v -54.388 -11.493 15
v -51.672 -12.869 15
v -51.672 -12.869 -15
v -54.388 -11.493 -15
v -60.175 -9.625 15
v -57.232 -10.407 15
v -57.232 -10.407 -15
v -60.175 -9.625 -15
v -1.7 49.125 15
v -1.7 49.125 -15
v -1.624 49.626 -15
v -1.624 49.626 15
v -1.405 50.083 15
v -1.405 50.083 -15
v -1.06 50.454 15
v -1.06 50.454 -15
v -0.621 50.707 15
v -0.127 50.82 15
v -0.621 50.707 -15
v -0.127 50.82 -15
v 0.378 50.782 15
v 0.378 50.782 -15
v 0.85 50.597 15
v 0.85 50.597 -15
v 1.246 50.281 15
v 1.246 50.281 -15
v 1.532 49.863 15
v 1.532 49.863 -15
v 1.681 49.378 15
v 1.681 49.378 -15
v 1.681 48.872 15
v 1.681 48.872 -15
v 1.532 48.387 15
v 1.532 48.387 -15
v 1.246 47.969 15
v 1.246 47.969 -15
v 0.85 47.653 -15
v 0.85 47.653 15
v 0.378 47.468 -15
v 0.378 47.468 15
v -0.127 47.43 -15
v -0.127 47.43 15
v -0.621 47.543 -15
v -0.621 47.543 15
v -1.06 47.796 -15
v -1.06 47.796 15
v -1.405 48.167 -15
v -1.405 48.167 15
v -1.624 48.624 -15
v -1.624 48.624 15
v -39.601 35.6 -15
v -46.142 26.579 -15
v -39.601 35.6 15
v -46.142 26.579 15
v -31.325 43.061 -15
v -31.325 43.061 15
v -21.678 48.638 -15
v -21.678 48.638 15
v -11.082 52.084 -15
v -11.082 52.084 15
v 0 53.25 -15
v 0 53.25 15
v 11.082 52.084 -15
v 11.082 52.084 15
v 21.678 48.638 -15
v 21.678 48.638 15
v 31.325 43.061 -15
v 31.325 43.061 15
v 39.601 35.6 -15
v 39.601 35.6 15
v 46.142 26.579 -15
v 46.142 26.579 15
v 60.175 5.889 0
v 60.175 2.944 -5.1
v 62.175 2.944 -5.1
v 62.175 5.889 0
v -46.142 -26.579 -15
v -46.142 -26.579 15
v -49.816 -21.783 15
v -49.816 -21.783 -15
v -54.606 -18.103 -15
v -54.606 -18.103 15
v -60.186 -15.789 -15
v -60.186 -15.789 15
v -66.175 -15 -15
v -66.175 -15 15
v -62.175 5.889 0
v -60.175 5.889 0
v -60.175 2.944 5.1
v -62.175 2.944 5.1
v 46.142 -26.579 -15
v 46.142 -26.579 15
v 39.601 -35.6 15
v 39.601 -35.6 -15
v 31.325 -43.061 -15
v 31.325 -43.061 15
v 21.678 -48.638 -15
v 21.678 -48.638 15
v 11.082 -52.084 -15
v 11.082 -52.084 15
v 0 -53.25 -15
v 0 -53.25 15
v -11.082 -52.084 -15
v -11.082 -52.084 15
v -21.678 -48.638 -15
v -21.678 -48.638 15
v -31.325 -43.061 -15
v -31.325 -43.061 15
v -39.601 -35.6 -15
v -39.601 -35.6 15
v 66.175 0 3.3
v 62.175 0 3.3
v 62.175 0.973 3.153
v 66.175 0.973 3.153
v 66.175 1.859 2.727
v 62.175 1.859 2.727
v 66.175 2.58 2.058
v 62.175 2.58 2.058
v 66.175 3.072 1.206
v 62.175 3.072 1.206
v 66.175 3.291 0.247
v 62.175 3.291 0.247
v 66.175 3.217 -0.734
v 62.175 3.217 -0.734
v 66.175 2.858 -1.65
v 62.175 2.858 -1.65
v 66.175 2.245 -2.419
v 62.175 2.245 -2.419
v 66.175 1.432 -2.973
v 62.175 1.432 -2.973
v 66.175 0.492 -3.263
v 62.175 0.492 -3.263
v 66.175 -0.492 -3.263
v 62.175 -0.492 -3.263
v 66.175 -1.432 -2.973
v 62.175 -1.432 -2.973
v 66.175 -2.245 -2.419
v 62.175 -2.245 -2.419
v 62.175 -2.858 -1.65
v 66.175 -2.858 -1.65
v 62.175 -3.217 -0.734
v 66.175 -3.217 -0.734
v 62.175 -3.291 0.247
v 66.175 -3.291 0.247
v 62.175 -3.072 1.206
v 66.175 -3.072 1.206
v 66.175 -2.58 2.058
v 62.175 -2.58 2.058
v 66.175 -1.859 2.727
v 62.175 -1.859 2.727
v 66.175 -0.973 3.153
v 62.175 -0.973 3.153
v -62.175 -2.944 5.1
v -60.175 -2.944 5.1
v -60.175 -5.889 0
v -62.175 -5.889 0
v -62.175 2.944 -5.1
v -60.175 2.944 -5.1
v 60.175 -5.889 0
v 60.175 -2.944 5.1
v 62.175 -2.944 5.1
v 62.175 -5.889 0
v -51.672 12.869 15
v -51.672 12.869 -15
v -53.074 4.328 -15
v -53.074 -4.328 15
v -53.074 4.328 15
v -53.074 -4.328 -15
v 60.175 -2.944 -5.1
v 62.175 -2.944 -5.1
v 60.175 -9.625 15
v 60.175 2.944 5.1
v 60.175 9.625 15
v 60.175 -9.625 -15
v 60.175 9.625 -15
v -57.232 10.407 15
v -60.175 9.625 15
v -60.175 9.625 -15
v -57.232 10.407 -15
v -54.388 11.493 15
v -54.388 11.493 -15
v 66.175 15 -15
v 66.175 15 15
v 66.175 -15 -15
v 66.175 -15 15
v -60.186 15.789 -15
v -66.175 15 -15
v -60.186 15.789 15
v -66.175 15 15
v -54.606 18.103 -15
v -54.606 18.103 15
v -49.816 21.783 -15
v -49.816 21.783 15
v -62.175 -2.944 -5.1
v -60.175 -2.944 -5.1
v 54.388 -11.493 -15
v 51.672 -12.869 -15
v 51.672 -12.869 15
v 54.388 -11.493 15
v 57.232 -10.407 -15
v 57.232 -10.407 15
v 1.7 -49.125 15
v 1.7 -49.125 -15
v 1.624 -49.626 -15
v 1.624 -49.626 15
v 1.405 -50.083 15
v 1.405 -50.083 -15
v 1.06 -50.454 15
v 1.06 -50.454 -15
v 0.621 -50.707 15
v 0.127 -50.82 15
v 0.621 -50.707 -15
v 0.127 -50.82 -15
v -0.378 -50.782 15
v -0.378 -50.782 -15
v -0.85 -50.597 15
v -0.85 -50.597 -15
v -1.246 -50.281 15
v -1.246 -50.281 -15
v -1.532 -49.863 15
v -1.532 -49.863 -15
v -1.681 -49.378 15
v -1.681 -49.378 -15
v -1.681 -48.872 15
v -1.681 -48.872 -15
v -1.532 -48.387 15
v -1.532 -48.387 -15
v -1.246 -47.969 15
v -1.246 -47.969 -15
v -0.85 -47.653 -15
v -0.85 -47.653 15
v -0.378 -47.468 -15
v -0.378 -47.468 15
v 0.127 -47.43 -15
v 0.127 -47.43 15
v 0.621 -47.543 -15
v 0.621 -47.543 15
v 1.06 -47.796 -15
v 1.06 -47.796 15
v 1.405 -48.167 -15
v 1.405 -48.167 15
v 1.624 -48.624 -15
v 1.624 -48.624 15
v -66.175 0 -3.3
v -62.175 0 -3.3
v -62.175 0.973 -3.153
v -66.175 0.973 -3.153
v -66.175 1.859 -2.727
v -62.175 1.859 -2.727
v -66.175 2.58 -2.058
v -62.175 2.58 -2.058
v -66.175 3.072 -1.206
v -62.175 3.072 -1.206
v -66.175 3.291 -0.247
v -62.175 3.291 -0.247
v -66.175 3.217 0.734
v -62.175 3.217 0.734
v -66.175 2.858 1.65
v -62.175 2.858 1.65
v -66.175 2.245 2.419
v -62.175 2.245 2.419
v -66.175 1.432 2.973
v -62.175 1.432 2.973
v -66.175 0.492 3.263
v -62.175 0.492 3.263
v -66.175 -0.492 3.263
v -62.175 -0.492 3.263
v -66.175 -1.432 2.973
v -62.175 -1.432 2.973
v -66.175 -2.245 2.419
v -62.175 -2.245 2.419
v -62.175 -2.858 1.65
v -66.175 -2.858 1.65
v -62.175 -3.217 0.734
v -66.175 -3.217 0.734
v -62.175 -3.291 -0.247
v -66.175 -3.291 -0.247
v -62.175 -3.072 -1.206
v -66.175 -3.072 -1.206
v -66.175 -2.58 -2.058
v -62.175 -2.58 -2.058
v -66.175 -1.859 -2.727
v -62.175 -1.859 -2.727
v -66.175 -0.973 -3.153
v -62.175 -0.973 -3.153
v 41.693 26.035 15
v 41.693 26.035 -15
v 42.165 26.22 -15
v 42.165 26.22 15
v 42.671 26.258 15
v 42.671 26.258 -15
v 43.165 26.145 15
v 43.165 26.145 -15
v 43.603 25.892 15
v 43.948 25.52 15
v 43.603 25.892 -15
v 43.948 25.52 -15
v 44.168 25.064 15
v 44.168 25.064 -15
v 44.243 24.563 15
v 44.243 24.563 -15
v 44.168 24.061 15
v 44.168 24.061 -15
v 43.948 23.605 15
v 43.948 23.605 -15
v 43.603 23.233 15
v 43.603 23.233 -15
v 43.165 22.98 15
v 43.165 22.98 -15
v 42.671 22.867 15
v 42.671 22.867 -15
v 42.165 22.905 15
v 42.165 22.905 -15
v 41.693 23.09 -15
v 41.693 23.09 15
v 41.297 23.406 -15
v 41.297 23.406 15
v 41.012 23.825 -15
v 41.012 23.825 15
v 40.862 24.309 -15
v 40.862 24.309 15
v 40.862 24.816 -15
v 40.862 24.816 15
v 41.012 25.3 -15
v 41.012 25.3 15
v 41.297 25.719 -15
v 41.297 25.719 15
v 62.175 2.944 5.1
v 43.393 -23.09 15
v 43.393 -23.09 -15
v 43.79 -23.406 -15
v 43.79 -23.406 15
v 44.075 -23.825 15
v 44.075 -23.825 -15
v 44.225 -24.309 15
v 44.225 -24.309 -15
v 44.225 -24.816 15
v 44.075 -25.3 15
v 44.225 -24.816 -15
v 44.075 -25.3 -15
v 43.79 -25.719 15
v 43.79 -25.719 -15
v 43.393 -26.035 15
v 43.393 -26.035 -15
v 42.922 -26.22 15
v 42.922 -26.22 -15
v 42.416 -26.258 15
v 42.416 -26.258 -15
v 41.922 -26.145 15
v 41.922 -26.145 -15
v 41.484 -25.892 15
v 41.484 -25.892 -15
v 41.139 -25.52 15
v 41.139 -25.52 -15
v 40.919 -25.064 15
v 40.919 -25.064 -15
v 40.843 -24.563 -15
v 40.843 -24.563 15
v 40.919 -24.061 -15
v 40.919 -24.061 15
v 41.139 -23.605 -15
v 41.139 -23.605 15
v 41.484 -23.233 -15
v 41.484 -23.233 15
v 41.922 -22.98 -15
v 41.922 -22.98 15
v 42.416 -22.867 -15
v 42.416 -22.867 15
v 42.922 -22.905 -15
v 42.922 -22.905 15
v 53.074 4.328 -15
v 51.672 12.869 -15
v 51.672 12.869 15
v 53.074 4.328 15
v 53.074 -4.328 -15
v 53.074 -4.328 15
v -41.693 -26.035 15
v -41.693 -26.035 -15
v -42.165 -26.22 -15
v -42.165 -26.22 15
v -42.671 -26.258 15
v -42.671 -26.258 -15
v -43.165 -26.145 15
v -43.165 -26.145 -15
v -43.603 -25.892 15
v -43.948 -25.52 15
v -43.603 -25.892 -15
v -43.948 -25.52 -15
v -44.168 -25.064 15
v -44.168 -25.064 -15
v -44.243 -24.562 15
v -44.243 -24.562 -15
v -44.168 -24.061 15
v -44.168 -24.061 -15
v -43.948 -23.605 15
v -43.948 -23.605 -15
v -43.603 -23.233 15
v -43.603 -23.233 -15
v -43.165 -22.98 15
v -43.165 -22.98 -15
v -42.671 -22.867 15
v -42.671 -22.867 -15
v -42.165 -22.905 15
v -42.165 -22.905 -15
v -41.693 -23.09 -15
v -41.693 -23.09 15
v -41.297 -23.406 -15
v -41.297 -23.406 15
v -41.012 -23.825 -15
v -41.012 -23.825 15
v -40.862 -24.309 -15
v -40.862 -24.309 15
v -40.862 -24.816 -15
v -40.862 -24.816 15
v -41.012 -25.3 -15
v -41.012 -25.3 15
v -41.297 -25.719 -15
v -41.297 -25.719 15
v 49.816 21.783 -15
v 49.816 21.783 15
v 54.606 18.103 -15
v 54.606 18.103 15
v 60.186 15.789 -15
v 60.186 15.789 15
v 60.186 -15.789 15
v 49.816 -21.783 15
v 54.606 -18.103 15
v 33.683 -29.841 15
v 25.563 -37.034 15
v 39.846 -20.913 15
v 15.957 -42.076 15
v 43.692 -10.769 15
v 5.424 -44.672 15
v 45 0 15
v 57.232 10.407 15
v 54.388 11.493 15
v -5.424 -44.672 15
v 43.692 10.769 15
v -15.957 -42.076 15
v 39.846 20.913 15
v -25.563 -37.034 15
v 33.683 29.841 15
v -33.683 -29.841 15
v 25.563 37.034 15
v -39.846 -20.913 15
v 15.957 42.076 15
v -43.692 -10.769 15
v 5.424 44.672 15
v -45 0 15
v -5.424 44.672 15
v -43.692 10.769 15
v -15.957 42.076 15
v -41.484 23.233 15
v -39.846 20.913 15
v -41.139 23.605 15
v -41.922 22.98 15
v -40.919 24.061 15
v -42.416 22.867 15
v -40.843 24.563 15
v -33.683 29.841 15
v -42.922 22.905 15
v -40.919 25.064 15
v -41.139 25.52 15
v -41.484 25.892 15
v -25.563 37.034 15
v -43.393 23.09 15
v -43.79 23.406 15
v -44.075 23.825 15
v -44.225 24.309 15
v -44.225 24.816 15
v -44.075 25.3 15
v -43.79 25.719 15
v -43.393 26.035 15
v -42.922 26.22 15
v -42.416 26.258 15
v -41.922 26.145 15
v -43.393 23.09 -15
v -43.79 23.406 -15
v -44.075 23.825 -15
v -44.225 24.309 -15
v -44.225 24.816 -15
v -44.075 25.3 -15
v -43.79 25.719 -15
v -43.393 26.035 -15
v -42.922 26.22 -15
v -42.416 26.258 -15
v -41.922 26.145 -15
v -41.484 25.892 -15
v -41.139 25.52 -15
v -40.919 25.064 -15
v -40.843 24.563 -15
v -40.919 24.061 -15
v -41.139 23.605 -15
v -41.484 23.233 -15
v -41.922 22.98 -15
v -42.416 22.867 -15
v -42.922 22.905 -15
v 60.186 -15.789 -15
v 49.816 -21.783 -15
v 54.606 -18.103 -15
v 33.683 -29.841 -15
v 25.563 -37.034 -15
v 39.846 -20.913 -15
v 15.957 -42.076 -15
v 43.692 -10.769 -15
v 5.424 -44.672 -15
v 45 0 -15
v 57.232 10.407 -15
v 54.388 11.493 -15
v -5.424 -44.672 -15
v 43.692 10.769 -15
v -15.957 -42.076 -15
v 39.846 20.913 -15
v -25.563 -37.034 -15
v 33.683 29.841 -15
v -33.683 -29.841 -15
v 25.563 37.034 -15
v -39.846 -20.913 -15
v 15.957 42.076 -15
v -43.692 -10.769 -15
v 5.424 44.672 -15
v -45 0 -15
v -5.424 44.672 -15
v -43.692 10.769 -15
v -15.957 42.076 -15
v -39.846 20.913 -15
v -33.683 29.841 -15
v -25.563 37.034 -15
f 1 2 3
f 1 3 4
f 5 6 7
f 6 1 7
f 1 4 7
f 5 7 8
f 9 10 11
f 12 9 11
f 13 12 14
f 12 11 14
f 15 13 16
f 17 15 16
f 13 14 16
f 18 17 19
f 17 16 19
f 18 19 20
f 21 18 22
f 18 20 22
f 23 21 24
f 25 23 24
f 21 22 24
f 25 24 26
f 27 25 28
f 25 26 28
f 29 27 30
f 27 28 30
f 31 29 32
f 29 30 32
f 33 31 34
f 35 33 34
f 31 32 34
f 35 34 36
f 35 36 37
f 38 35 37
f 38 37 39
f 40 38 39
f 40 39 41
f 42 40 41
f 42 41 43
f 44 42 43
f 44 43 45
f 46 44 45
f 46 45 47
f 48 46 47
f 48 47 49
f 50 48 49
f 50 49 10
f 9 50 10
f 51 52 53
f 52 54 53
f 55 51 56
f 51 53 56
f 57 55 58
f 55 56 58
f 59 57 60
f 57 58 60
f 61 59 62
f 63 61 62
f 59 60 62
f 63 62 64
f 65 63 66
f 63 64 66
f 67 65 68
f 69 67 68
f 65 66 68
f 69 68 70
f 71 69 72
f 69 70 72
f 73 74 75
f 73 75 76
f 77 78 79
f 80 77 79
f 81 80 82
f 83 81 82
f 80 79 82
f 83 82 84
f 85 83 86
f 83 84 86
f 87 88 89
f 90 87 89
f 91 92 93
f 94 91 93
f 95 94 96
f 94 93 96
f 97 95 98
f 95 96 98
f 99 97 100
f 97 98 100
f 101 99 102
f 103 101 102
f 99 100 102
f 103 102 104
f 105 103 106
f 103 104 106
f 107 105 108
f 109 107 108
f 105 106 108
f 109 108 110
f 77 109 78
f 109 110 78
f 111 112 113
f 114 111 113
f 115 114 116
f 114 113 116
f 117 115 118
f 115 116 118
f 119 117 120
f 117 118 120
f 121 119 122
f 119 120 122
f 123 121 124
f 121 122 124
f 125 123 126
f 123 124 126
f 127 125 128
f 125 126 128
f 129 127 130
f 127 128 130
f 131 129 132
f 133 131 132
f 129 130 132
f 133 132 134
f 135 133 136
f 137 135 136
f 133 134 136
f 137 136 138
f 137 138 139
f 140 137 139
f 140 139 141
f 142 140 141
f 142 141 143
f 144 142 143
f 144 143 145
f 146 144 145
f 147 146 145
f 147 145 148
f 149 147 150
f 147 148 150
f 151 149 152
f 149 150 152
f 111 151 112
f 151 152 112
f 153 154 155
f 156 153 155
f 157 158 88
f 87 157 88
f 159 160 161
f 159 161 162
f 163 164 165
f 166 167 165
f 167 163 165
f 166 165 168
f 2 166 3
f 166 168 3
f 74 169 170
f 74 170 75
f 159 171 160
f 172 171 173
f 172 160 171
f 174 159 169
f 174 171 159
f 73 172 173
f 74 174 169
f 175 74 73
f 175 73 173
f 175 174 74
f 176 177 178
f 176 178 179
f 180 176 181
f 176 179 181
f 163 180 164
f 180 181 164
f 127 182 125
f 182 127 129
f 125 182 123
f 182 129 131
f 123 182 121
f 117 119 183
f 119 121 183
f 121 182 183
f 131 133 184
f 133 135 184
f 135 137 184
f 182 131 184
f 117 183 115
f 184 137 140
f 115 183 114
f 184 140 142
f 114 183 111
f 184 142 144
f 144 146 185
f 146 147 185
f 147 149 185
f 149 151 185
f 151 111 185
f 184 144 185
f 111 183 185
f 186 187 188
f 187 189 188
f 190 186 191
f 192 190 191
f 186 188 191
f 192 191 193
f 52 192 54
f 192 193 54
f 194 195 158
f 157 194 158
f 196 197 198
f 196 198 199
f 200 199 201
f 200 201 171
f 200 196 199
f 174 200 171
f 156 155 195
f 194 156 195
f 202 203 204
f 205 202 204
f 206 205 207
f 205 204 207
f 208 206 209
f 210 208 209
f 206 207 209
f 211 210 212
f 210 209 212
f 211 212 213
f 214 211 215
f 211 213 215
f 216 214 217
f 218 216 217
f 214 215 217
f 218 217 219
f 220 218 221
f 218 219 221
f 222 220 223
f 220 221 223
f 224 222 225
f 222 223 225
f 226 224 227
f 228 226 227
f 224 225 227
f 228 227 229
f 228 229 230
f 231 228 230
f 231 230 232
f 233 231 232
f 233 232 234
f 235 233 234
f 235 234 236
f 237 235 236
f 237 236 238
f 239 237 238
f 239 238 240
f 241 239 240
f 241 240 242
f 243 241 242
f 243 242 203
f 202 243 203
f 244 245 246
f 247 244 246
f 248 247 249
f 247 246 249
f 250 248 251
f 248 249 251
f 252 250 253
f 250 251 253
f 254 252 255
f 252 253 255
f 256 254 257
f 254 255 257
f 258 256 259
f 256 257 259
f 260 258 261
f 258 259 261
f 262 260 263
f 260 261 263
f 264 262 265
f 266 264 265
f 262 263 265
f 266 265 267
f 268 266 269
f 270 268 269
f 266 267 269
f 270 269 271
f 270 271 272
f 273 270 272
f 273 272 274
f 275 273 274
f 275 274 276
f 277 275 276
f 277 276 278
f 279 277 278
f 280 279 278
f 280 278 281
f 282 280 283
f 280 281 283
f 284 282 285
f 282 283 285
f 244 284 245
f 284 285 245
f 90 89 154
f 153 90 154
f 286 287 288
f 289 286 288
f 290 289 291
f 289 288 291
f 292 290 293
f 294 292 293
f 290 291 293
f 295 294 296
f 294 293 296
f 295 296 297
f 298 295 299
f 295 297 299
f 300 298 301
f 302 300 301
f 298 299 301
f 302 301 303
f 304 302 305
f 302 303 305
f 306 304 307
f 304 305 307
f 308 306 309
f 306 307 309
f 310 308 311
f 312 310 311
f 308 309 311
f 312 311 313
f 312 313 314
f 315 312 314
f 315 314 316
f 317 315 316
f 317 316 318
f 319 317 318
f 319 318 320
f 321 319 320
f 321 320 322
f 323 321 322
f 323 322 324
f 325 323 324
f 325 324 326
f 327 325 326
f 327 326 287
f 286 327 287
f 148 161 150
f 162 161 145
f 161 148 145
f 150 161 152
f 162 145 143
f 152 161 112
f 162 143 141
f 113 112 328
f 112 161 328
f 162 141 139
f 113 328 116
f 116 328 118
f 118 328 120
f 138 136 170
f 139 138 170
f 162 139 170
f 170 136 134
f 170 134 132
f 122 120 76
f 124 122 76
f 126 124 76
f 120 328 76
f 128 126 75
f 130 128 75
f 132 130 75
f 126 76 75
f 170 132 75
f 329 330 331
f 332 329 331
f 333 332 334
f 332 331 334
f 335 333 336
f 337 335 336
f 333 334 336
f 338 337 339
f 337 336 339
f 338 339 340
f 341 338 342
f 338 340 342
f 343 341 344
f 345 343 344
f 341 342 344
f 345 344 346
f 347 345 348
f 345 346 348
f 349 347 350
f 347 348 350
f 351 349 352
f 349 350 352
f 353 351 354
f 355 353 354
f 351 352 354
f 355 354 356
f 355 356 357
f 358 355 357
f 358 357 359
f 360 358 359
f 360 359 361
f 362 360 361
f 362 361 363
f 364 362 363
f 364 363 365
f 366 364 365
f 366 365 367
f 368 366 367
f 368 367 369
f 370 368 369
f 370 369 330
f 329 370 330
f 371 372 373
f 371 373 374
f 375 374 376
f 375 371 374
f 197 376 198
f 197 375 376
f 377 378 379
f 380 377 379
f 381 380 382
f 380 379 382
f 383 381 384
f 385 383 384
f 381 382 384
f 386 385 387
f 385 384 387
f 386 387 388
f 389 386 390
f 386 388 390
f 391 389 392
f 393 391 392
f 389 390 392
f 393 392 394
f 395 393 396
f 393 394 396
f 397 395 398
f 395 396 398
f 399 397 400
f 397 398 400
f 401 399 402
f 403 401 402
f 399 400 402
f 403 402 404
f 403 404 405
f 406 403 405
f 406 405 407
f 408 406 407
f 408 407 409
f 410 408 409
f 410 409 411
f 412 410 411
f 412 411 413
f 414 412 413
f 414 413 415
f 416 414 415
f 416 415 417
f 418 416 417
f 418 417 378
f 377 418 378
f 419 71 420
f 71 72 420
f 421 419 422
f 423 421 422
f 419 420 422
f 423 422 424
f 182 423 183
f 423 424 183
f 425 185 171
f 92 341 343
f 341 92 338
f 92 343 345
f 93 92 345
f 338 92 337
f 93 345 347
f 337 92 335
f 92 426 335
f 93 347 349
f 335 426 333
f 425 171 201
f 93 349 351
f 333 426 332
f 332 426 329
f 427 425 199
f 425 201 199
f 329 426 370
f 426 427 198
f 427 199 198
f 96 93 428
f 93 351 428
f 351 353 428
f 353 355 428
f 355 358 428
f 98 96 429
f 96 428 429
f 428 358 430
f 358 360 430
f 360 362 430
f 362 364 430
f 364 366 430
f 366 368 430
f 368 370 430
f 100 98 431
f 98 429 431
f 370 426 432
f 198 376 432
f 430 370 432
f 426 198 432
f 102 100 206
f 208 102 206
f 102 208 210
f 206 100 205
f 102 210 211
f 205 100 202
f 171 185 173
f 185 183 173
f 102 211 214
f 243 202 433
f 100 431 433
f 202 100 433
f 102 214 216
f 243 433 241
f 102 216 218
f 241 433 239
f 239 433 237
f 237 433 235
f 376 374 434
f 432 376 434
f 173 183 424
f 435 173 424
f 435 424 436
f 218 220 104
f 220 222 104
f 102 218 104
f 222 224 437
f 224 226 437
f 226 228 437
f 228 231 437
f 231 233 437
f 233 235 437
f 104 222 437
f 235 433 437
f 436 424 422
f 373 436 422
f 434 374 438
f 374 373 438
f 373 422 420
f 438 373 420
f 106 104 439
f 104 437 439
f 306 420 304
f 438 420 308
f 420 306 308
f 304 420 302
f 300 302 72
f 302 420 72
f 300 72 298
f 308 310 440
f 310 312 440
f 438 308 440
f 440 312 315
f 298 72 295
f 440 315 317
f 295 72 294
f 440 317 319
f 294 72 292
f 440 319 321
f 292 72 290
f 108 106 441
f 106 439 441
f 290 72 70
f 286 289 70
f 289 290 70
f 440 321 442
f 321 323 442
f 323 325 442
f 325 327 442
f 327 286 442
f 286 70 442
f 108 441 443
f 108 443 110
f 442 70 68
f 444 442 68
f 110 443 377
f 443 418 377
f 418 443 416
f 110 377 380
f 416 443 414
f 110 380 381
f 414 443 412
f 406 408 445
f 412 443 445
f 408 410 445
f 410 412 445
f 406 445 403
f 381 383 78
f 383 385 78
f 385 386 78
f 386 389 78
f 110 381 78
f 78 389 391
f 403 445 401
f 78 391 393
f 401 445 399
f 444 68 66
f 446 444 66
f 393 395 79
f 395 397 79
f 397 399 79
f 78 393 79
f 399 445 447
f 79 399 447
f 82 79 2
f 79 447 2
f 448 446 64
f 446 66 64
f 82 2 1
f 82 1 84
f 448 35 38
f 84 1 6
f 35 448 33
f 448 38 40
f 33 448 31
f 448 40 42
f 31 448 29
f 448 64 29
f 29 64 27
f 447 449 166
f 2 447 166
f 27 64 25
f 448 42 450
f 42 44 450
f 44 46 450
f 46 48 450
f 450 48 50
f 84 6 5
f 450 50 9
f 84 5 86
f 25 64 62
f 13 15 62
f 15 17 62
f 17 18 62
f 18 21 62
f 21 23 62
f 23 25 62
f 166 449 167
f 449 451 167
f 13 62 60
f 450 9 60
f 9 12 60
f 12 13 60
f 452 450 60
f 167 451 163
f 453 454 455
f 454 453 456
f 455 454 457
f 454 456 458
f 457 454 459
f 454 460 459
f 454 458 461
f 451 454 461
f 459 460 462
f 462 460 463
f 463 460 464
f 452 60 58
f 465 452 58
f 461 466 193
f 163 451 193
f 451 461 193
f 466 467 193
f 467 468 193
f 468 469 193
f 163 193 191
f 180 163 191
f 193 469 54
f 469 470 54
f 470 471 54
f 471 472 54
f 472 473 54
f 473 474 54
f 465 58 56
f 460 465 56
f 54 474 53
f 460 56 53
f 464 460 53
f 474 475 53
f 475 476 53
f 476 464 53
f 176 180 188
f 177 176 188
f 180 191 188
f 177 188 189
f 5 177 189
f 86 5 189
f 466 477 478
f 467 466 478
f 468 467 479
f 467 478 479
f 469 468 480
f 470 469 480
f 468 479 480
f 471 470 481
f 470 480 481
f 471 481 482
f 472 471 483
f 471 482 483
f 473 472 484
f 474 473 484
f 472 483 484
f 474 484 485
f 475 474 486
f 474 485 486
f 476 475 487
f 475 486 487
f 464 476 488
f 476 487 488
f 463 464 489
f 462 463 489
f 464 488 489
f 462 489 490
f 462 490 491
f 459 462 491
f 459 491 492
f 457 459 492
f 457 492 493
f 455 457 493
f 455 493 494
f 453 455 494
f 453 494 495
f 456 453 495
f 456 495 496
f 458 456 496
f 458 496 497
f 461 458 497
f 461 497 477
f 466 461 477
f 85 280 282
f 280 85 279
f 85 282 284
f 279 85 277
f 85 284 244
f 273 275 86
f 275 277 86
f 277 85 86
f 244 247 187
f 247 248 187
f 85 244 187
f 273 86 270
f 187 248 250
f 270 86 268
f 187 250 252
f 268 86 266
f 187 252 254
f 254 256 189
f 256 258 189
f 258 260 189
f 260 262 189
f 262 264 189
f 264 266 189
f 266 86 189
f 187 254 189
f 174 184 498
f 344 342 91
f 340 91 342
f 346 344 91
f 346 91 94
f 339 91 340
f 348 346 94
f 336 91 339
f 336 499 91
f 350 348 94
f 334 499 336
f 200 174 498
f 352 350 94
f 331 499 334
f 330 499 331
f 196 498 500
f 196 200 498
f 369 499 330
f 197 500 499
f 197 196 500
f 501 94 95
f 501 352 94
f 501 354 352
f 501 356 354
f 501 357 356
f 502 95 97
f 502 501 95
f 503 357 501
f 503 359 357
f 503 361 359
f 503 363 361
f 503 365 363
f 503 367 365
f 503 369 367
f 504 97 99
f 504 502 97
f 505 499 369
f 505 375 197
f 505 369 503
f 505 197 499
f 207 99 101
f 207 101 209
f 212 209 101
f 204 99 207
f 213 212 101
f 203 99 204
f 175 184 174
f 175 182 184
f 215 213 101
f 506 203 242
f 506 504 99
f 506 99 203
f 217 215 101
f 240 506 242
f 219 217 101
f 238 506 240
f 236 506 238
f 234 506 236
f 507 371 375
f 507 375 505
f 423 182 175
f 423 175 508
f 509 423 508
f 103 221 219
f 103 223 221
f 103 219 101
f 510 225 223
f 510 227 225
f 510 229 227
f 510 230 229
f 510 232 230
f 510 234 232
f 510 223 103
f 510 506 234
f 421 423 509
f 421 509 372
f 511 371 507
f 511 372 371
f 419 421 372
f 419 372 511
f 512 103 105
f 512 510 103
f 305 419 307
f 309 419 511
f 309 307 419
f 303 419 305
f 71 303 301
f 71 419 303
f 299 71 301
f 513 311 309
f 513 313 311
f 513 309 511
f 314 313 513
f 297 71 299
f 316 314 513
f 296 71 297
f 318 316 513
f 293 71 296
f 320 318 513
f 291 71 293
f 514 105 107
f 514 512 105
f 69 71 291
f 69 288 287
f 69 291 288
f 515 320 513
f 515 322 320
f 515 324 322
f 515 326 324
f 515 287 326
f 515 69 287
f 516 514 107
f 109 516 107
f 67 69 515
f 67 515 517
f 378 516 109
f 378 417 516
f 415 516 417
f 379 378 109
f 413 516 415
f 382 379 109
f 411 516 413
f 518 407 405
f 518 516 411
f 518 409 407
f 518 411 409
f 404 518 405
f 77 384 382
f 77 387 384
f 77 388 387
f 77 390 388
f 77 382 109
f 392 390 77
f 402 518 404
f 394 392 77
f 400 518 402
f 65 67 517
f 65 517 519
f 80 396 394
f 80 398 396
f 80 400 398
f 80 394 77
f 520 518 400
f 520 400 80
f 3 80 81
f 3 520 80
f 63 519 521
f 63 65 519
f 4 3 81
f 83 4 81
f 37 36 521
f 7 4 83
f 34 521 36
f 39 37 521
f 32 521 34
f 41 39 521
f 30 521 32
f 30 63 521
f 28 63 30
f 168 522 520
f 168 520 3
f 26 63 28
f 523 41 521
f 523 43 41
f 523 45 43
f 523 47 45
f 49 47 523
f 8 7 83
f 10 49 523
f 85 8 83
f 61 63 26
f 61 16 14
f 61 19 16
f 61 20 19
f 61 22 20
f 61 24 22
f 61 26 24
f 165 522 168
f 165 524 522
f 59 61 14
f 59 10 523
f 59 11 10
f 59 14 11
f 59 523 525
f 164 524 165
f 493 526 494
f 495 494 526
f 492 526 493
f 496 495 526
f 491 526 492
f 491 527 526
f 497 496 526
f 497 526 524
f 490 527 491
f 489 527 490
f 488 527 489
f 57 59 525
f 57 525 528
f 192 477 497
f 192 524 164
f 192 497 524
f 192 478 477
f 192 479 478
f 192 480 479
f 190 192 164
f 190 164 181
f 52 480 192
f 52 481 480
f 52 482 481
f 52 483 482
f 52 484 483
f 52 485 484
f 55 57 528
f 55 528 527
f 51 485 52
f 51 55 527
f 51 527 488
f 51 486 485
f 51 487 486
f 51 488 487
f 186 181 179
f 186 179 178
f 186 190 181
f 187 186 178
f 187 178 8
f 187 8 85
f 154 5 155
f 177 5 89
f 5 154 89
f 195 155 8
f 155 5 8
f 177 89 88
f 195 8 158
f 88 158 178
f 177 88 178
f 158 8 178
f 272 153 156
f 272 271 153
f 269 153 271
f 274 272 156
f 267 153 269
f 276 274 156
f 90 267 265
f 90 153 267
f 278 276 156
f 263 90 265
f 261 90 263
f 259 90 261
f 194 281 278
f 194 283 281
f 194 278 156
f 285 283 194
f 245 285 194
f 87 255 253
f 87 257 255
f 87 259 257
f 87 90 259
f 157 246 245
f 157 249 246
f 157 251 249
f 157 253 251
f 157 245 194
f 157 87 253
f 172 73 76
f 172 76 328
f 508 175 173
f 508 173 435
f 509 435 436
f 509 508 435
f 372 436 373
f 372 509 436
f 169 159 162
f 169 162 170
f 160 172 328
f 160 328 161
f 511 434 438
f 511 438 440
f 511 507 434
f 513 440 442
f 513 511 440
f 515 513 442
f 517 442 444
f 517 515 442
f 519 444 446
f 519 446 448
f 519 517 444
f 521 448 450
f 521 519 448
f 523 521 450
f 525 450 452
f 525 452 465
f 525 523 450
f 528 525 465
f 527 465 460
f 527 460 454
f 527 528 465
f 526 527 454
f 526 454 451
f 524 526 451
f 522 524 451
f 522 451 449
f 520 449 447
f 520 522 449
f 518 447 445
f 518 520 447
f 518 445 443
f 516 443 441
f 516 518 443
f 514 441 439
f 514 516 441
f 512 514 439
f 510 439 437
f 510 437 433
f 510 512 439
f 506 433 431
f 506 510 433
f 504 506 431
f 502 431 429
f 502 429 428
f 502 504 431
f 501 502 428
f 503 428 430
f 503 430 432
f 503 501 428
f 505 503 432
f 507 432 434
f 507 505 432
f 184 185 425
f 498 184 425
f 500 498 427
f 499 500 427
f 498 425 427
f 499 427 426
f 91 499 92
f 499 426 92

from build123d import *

# Parameters (mm, degrees)
SKETCH1_R                = 45
BOSS_EXTRUDE1_DEPTH      = 15
CUT_EXTRUDE1_DEPTH       = 91.081591488
CUT_EXTRUDE1_DEPTH_BACK  = 91.081591488
M6_CLEARANCE_HOLE1_D     = 6.6
M6_CLEARANCE_HOLE1_DEPTH = 6
M6_CLEARANCE_HOLE1_TIP   = 1.982840043
M6_CLEARANCE_HOLE2_D     = 6.6
M6_CLEARANCE_HOLE2_DEPTH = 6
M6_CLEARANCE_HOLE2_TIP   = 1.982840043
M3_CLEARANCE_HOLE1_D     = 3.4
CIRPATTERN1_COUNT        = 6
CUT_EXTRUDE2_DEPTH       = 2


with BuildPart() as part:
    # Sketch1 → Boss-Extrude1 (new, symmetric)
    with BuildSketch(Plane.XY):
        with BuildLine():
            Line((-66.175, -15), (-66.175, 15))
            ThreePointArc((-66.175, 15), (-54.605786302, 18.103041727), (-46.142284003, 26.579167161))
            ThreePointArc((-46.142284003, 26.579167161), (0, 53.25), (46.142284003, 26.579167161))
            ThreePointArc((46.142284003, 26.579167161), (54.605786302, 18.103041727), (66.175, 15))
            Line((66.175, 15), (66.175, -15))
            ThreePointArc((66.175, -15), (54.605786302, -18.103041727), (46.142284003, -26.579167161))
            ThreePointArc((46.142284003, -26.579167161), (0, -53.25), (-46.142284003, -26.579167161))
            ThreePointArc((-46.142284003, -26.579167161), (-54.605786302, -18.103041727), (-66.175, -15))
        make_face()
        Circle(SKETCH1_R, mode=Mode.SUBTRACT)
    extrude(amount=BOSS_EXTRUDE1_DEPTH, both=True)

    # Sketch2 → Cut-Extrude1 (cut, two sides: drawn at the far end of the back side and taken through both)
    with BuildSketch(Plane.XY.offset(15).offset(-CUT_EXTRUDE1_DEPTH_BACK)):
        with BuildLine():
            Line((-60.175, -9.624867567), (-60.175, 9.624867567))
            ThreePointArc((-60.175, 9.624867567), (-55.795757401, 10.912645684), (-51.671575635, 12.868984861))
            ThreePointArc((-51.671575635, 12.868984861), (-53.25, 0), (-51.671575635, -12.868984861))
            ThreePointArc((-51.671575635, -12.868984861), (-55.795757401, -10.912645684), (-60.175, -9.624867567))
        make_face()
        with BuildLine():
            Line((60.175, -9.624867567), (60.175, 9.624867567))
            ThreePointArc((60.175, 9.624867567), (55.795757401, 10.912645684), (51.671575635, 12.868984861))
            ThreePointArc((51.671575635, 12.868984861), (53.25, 0), (51.671575635, -12.868984861))
            ThreePointArc((51.671575635, -12.868984861), (55.795757401, -10.912645684), (60.175, -9.624867567))
        make_face()
    extrude(amount=CUT_EXTRUDE1_DEPTH + CUT_EXTRUDE1_DEPTH_BACK, mode=Mode.SUBTRACT)

    # M6 Clearance Hole1
    with Locations(Plane.ZY.offset(66.175)):
        with Locations((0, 0)):
            Hole(M6_CLEARANCE_HOLE1_D / 2, depth=M6_CLEARANCE_HOLE1_DEPTH)
            with Locations((0, 0, -(M6_CLEARANCE_HOLE1_DEPTH + M6_CLEARANCE_HOLE1_TIP / 2))):  # 118° drill point
                Cone(0, M6_CLEARANCE_HOLE1_D / 2, M6_CLEARANCE_HOLE1_TIP, mode=Mode.SUBTRACT)

    # M6 Clearance Hole2
    with Locations(Plane(origin=(66.175, 0, 0), x_dir=(0, 0, -1), z_dir=(1, 0, 0))):
        with Locations((0, 0)):
            Hole(M6_CLEARANCE_HOLE2_D / 2, depth=M6_CLEARANCE_HOLE2_DEPTH)
            with Locations((0, 0, -(M6_CLEARANCE_HOLE2_DEPTH + M6_CLEARANCE_HOLE2_TIP / 2))):  # 118° drill point
                Cone(0, M6_CLEARANCE_HOLE2_D / 2, M6_CLEARANCE_HOLE2_TIP, mode=Mode.SUBTRACT)

    # M3 Clearance Hole1 (through all)
    with Locations(Plane.XY.offset(15)):
        with Locations((0, 49.125)):
            m3_clearance_hole1 = Hole(M3_CLEARANCE_HOLE1_D / 2)

    # CirPattern1: M3 Clearance Hole1 ×6 about axis
    cirpattern1_axis = Axis((0, 0, 0), (0, 0, 1))
    for i in range(1, CIRPATTERN1_COUNT):
        add(m3_clearance_hole1.rotate(cirpattern1_axis, i * 360 / CIRPATTERN1_COUNT), mode=Mode.SUBTRACT)

    # Sketch9 → Cut-Extrude2 (cut)
    with BuildSketch(Plane(origin=(-60.175, 0, 0), x_dir=(0, 0, -1), z_dir=(1, 0, 0))):
        Polygon((0, 5.888972746), (-5.1, 2.944486373), (-5.1, -2.944486373), (0, -5.888972746), (5.1, -2.944486373), (5.1, 2.944486373), align=None)
    cut_extrude2 = extrude(amount=-CUT_EXTRUDE2_DEPTH, mode=Mode.SUBTRACT)

    # Mirror1: Cut-Extrude2 across plane
    add(cut_extrude2.mirror(Plane(origin=(0, 0, 0), x_dir=(0, 0, 1), z_dir=(1, 0, 0))), mode=Mode.SUBTRACT)


solid = part.part
